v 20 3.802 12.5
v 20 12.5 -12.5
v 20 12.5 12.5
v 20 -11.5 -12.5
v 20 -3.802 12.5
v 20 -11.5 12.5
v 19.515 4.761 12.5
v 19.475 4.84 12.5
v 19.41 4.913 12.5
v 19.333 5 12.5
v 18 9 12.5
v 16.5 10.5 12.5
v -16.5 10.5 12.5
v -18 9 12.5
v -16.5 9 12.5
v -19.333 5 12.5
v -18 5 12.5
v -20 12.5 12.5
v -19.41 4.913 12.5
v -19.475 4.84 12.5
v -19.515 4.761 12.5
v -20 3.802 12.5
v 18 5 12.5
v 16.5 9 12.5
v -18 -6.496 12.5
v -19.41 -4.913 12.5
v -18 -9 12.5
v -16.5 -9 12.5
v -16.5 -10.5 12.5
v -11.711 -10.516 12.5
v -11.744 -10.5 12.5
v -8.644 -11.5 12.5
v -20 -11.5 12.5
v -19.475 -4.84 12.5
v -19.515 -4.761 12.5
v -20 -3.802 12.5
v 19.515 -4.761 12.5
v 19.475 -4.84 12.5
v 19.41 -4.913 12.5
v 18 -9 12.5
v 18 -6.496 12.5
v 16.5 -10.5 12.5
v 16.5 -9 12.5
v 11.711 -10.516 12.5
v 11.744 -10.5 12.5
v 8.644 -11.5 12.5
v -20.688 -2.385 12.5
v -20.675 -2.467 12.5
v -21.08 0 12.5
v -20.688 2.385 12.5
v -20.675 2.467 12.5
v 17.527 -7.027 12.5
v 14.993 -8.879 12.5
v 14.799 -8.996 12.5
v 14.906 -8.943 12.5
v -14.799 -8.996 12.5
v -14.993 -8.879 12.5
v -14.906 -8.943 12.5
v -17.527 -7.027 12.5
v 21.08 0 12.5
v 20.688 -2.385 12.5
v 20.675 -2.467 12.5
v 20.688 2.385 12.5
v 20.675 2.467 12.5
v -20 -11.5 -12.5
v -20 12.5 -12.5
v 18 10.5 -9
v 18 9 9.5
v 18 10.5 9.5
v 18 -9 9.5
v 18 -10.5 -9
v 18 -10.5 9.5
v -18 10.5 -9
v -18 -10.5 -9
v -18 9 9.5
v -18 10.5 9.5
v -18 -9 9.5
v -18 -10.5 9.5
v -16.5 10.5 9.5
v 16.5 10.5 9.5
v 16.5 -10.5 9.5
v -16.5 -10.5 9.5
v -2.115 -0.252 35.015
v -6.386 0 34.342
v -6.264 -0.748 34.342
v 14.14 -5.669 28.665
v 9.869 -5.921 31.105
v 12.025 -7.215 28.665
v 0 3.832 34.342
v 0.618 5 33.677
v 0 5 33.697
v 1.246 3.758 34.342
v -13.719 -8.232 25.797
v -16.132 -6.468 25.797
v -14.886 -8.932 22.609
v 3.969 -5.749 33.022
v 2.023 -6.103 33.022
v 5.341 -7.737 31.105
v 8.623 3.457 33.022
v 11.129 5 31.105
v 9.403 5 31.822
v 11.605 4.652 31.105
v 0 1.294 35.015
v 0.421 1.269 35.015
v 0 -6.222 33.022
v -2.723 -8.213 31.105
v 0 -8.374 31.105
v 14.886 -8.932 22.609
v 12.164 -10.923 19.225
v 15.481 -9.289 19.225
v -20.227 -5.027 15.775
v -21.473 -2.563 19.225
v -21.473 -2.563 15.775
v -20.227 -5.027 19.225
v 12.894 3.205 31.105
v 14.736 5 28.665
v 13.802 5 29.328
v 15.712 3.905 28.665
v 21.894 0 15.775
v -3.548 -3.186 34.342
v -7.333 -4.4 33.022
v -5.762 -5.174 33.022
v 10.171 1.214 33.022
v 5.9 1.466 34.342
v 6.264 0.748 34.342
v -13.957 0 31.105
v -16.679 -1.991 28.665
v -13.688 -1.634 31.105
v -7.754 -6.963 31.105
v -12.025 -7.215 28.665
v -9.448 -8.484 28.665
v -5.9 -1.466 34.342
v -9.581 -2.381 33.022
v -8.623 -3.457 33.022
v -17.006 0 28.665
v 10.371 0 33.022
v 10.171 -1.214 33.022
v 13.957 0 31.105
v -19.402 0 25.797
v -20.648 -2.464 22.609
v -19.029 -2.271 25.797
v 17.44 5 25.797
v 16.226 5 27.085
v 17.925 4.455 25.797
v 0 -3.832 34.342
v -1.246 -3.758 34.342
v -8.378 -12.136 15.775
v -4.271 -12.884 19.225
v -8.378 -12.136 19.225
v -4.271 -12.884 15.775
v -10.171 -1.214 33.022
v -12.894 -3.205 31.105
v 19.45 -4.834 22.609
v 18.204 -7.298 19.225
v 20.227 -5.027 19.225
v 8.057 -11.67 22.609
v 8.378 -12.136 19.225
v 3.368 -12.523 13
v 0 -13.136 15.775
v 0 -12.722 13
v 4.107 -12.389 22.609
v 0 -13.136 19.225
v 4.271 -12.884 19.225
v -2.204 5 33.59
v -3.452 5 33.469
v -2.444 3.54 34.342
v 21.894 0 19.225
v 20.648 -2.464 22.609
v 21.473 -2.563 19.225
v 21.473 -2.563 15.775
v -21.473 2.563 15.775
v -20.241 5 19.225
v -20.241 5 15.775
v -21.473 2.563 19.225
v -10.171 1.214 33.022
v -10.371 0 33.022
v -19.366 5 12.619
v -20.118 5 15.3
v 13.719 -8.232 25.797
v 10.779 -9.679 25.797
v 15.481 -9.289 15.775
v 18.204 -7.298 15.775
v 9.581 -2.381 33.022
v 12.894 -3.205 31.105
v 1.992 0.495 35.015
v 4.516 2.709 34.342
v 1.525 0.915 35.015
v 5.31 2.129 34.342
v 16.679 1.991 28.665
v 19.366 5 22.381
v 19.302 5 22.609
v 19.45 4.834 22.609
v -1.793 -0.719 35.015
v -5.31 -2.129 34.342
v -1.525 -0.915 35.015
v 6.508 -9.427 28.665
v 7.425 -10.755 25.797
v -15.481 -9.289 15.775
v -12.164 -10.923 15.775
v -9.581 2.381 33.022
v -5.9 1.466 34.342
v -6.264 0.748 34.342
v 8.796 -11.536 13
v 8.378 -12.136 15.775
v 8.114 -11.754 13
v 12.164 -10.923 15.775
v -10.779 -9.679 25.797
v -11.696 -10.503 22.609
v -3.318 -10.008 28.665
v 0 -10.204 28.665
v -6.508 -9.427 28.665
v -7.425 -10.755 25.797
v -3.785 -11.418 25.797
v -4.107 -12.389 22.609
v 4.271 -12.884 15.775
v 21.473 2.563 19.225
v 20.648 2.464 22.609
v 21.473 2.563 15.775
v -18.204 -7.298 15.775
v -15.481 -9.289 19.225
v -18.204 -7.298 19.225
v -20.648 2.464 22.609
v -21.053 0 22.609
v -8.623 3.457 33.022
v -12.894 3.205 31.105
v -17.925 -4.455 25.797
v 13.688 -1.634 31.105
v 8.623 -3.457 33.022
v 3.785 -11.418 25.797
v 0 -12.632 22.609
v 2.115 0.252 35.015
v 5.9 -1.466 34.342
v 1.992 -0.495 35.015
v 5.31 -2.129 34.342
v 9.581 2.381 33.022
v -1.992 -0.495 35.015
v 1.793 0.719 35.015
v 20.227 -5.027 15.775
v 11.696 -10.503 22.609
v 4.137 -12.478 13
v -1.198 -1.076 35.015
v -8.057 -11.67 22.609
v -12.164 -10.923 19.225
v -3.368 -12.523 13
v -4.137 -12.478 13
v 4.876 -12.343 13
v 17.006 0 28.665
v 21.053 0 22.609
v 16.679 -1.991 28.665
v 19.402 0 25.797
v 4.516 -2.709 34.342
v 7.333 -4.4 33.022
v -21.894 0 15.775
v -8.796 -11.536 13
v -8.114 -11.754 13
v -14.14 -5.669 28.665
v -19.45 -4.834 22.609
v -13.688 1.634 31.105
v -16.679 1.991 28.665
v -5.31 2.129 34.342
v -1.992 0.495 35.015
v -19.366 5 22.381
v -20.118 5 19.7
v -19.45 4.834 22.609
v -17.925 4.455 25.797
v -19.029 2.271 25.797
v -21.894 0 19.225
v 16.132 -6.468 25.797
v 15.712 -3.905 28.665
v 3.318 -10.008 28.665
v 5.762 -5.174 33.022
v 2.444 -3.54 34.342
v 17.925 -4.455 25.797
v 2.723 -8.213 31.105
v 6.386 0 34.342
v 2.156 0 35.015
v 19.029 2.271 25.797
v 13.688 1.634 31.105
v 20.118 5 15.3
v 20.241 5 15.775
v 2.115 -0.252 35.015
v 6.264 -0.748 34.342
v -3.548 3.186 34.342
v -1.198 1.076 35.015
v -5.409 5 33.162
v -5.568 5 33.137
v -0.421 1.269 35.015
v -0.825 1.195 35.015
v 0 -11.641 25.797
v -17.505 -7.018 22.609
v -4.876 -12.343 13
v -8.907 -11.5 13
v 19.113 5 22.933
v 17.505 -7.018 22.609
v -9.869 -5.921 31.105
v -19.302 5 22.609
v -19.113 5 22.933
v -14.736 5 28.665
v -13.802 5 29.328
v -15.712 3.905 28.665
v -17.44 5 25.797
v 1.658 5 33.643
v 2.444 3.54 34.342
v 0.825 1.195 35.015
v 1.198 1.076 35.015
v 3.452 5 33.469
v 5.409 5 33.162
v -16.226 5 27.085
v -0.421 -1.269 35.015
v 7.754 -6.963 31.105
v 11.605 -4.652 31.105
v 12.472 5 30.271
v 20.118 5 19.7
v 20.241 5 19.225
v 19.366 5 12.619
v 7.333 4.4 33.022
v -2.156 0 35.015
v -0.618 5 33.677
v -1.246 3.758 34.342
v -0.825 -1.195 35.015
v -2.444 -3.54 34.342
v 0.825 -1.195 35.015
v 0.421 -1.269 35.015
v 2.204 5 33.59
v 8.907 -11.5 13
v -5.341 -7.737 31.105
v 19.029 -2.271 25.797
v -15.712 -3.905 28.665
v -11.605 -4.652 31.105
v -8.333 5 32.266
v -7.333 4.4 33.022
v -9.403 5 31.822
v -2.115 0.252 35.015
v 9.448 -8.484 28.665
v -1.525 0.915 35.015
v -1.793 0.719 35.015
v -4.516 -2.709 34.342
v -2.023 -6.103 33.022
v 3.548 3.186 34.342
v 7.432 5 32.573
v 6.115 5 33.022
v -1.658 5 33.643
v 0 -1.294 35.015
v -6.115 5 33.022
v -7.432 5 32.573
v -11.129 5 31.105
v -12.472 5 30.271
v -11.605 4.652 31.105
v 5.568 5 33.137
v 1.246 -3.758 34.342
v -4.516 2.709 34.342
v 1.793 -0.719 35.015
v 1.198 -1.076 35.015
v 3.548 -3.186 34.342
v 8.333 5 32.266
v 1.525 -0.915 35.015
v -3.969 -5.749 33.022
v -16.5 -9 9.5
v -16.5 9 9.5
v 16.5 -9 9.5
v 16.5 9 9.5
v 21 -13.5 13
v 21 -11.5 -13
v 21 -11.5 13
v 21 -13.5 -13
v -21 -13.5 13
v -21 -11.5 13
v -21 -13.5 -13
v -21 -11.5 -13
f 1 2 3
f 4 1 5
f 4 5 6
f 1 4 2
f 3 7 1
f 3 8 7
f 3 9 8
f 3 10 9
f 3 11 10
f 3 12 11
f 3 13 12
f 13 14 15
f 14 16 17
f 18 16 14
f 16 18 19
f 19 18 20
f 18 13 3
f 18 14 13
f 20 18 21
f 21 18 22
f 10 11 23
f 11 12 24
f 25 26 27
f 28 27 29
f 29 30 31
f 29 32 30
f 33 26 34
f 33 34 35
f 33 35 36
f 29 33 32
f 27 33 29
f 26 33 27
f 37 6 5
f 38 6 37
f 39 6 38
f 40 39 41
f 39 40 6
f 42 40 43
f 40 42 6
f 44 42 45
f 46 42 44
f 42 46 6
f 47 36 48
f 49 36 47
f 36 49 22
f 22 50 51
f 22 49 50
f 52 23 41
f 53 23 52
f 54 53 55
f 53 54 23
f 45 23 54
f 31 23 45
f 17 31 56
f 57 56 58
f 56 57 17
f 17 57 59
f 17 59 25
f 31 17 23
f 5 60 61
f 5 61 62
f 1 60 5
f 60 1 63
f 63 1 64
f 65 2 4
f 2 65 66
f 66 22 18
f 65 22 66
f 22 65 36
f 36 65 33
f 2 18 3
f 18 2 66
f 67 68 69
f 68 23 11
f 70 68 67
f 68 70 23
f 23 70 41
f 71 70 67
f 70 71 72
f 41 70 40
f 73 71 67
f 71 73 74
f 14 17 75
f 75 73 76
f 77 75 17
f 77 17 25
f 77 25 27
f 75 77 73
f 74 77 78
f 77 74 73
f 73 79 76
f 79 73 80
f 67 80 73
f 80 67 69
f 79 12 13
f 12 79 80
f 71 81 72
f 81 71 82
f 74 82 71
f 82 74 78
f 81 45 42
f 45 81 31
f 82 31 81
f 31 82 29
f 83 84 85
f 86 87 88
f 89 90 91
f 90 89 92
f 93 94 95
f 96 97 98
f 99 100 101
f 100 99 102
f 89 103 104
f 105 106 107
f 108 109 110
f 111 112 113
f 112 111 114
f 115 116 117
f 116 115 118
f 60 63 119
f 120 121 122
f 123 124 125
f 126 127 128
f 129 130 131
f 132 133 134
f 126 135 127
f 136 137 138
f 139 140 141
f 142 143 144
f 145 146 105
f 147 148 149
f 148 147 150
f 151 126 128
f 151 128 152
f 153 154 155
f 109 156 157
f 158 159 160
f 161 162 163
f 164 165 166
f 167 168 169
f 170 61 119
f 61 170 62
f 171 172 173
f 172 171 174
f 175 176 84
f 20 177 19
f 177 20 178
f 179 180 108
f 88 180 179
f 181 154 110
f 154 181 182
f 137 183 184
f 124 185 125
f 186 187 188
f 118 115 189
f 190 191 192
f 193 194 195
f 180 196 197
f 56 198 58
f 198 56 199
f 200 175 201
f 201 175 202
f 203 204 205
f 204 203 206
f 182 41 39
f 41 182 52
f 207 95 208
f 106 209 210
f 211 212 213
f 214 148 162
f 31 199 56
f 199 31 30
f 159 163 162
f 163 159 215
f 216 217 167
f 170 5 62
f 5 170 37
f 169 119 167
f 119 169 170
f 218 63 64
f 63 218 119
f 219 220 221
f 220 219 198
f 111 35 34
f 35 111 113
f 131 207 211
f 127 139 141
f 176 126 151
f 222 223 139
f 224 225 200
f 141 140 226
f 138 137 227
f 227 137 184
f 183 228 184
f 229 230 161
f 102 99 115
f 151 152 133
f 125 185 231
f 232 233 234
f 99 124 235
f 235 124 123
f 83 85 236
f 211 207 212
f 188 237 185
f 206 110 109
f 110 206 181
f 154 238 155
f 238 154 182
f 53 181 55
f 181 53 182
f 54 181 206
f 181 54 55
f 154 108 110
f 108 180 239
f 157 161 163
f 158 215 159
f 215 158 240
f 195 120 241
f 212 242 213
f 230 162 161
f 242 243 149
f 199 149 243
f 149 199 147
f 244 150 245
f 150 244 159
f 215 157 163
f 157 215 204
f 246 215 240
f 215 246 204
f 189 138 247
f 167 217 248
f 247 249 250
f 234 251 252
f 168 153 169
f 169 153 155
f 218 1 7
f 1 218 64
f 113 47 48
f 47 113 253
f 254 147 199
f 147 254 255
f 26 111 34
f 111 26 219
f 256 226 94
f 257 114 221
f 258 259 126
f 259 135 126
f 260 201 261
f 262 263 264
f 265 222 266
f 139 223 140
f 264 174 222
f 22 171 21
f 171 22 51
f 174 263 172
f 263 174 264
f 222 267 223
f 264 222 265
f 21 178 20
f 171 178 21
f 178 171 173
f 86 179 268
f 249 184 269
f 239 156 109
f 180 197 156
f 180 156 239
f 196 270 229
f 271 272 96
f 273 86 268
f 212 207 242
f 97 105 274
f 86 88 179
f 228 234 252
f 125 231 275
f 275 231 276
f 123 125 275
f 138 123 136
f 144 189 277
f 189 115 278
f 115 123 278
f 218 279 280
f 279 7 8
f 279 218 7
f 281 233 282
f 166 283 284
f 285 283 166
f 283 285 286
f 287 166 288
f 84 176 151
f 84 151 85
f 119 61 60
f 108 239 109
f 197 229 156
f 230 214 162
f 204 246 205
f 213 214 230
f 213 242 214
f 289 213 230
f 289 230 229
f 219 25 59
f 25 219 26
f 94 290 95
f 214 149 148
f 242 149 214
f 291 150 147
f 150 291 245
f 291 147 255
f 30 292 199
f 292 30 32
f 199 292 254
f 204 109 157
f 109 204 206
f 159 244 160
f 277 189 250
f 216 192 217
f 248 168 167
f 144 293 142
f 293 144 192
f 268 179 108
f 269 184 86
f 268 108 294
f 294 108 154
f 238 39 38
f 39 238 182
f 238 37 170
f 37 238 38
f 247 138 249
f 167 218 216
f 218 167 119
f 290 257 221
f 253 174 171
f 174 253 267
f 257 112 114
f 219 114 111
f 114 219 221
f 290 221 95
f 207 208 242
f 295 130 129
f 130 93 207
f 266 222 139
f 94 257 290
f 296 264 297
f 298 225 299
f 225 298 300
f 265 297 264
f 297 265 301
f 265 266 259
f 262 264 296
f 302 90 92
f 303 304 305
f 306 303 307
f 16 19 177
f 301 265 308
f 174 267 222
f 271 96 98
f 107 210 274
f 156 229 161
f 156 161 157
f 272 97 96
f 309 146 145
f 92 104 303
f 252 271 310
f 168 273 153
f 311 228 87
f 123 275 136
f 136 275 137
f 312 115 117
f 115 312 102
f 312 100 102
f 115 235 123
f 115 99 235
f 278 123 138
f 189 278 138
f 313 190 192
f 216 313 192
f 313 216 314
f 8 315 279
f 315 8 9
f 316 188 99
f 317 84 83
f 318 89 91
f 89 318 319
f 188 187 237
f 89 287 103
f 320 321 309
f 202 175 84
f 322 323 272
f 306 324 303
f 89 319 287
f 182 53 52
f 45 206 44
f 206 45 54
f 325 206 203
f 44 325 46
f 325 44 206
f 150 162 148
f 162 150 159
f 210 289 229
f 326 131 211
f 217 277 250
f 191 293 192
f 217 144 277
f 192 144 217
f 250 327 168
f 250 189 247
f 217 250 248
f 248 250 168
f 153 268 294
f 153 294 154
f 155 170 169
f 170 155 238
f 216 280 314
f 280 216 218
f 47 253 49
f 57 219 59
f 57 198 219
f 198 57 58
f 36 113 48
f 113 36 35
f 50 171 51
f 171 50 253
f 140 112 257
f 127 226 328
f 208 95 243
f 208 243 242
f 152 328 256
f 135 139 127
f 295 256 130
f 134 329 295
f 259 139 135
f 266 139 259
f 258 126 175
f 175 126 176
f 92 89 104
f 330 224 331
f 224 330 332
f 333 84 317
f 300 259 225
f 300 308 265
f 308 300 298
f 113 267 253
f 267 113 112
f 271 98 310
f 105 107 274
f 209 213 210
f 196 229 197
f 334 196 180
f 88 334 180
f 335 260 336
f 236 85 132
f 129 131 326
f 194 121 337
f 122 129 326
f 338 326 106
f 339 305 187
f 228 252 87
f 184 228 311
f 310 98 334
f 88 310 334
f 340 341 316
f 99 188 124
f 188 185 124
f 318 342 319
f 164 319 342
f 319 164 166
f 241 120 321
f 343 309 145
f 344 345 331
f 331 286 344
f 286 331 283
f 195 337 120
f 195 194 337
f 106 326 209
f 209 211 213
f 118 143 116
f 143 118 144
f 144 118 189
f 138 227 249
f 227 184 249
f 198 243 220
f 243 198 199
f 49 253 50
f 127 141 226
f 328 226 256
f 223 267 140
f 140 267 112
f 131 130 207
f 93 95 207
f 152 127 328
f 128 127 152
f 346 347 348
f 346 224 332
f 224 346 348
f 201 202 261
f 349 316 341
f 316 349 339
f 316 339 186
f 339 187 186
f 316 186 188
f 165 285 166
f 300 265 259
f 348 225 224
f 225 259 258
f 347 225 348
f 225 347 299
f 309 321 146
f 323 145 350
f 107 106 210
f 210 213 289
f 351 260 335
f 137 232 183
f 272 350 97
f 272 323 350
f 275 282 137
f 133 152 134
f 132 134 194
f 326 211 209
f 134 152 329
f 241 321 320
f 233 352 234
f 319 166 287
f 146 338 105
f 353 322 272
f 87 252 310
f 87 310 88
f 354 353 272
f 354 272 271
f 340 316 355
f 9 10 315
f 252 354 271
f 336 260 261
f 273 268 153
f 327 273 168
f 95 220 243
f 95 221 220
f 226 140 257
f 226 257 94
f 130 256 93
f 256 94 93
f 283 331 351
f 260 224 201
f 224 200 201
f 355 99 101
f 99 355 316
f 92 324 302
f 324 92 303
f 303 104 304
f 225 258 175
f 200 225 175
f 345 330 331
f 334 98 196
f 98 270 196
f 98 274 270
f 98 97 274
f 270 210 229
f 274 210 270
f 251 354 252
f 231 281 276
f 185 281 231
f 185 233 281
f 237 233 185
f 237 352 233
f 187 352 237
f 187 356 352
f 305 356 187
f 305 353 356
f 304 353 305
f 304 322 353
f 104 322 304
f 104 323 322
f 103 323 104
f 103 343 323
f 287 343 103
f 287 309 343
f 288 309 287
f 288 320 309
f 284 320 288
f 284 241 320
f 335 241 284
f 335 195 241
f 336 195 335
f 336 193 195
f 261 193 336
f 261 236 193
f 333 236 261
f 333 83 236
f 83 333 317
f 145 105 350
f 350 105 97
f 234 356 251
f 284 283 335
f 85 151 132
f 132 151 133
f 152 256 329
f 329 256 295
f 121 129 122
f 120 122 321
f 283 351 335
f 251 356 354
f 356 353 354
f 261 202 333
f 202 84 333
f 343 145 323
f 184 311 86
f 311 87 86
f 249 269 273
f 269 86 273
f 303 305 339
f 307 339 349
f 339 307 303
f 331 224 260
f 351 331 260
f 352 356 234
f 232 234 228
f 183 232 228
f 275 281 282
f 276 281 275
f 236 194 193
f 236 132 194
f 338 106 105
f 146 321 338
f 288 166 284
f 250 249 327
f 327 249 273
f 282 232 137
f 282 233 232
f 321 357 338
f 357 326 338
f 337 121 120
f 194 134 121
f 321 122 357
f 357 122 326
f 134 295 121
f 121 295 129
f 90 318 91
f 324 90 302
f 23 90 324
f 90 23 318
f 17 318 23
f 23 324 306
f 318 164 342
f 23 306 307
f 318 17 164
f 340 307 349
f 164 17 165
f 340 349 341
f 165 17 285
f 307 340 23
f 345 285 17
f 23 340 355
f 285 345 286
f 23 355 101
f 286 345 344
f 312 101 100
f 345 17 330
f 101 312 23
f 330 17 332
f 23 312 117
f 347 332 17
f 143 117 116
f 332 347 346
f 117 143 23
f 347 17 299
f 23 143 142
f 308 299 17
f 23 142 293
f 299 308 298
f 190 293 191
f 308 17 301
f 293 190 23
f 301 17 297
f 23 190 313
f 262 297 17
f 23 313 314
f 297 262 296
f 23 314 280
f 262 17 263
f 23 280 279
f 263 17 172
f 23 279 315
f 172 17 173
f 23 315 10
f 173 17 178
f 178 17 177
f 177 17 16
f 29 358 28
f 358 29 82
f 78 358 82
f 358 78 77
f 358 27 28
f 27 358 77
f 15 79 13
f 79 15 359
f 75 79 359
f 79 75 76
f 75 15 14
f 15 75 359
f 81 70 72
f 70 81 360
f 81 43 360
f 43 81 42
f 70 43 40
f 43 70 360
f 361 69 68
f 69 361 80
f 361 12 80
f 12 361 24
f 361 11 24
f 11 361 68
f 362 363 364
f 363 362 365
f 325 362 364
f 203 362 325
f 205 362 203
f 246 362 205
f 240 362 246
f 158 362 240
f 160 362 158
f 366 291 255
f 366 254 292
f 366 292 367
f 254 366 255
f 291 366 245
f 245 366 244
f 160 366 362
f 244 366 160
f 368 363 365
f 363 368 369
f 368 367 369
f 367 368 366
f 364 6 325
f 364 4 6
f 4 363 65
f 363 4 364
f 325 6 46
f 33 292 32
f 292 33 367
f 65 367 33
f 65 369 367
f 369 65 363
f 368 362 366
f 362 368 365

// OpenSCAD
$fn = 32;

// Treasure Chest - Low Poly

module chest_body() {
    difference() {
        // Main box
        cube([40, 25, 25], center = true);
        
        // Hollow inside
        translate([0, 0, 2])
            cube([36, 21, 22], center = true);
    }
}

module chest_lid() {
    translate([0, 0, 12.5])
    rotate([0, 0, 0])
    difference() {
        // Arched lid shape
        translate([0, 0, 5])
        scale([1, 0.6, 0.8])
        sphere(r = 22);
        
        // Flatten bottom of lid
        translate([0, 0, -25])
        cube([50, 50, 50], center = true);
        
        // Flatten front of lid (cut off)
        translate([0, 15, 0])
        cube([50, 20, 50], center = true);
    }
}

module brass_trim() {
    // Front trim
    translate([0, -12.5, 0])
    cube([42, 2, 26], center = true);
    
    // Corner reinforcements
    for(x=[-18, 18], y=[-10.5, 10.5], z=[-11, 11]) {
        translate([x, y, z])
        cube([3, 3, 3], center = true);
    }
}

// Combine everything
union() {
    chest_body();
    chest_lid();
    brass_trim();
}
